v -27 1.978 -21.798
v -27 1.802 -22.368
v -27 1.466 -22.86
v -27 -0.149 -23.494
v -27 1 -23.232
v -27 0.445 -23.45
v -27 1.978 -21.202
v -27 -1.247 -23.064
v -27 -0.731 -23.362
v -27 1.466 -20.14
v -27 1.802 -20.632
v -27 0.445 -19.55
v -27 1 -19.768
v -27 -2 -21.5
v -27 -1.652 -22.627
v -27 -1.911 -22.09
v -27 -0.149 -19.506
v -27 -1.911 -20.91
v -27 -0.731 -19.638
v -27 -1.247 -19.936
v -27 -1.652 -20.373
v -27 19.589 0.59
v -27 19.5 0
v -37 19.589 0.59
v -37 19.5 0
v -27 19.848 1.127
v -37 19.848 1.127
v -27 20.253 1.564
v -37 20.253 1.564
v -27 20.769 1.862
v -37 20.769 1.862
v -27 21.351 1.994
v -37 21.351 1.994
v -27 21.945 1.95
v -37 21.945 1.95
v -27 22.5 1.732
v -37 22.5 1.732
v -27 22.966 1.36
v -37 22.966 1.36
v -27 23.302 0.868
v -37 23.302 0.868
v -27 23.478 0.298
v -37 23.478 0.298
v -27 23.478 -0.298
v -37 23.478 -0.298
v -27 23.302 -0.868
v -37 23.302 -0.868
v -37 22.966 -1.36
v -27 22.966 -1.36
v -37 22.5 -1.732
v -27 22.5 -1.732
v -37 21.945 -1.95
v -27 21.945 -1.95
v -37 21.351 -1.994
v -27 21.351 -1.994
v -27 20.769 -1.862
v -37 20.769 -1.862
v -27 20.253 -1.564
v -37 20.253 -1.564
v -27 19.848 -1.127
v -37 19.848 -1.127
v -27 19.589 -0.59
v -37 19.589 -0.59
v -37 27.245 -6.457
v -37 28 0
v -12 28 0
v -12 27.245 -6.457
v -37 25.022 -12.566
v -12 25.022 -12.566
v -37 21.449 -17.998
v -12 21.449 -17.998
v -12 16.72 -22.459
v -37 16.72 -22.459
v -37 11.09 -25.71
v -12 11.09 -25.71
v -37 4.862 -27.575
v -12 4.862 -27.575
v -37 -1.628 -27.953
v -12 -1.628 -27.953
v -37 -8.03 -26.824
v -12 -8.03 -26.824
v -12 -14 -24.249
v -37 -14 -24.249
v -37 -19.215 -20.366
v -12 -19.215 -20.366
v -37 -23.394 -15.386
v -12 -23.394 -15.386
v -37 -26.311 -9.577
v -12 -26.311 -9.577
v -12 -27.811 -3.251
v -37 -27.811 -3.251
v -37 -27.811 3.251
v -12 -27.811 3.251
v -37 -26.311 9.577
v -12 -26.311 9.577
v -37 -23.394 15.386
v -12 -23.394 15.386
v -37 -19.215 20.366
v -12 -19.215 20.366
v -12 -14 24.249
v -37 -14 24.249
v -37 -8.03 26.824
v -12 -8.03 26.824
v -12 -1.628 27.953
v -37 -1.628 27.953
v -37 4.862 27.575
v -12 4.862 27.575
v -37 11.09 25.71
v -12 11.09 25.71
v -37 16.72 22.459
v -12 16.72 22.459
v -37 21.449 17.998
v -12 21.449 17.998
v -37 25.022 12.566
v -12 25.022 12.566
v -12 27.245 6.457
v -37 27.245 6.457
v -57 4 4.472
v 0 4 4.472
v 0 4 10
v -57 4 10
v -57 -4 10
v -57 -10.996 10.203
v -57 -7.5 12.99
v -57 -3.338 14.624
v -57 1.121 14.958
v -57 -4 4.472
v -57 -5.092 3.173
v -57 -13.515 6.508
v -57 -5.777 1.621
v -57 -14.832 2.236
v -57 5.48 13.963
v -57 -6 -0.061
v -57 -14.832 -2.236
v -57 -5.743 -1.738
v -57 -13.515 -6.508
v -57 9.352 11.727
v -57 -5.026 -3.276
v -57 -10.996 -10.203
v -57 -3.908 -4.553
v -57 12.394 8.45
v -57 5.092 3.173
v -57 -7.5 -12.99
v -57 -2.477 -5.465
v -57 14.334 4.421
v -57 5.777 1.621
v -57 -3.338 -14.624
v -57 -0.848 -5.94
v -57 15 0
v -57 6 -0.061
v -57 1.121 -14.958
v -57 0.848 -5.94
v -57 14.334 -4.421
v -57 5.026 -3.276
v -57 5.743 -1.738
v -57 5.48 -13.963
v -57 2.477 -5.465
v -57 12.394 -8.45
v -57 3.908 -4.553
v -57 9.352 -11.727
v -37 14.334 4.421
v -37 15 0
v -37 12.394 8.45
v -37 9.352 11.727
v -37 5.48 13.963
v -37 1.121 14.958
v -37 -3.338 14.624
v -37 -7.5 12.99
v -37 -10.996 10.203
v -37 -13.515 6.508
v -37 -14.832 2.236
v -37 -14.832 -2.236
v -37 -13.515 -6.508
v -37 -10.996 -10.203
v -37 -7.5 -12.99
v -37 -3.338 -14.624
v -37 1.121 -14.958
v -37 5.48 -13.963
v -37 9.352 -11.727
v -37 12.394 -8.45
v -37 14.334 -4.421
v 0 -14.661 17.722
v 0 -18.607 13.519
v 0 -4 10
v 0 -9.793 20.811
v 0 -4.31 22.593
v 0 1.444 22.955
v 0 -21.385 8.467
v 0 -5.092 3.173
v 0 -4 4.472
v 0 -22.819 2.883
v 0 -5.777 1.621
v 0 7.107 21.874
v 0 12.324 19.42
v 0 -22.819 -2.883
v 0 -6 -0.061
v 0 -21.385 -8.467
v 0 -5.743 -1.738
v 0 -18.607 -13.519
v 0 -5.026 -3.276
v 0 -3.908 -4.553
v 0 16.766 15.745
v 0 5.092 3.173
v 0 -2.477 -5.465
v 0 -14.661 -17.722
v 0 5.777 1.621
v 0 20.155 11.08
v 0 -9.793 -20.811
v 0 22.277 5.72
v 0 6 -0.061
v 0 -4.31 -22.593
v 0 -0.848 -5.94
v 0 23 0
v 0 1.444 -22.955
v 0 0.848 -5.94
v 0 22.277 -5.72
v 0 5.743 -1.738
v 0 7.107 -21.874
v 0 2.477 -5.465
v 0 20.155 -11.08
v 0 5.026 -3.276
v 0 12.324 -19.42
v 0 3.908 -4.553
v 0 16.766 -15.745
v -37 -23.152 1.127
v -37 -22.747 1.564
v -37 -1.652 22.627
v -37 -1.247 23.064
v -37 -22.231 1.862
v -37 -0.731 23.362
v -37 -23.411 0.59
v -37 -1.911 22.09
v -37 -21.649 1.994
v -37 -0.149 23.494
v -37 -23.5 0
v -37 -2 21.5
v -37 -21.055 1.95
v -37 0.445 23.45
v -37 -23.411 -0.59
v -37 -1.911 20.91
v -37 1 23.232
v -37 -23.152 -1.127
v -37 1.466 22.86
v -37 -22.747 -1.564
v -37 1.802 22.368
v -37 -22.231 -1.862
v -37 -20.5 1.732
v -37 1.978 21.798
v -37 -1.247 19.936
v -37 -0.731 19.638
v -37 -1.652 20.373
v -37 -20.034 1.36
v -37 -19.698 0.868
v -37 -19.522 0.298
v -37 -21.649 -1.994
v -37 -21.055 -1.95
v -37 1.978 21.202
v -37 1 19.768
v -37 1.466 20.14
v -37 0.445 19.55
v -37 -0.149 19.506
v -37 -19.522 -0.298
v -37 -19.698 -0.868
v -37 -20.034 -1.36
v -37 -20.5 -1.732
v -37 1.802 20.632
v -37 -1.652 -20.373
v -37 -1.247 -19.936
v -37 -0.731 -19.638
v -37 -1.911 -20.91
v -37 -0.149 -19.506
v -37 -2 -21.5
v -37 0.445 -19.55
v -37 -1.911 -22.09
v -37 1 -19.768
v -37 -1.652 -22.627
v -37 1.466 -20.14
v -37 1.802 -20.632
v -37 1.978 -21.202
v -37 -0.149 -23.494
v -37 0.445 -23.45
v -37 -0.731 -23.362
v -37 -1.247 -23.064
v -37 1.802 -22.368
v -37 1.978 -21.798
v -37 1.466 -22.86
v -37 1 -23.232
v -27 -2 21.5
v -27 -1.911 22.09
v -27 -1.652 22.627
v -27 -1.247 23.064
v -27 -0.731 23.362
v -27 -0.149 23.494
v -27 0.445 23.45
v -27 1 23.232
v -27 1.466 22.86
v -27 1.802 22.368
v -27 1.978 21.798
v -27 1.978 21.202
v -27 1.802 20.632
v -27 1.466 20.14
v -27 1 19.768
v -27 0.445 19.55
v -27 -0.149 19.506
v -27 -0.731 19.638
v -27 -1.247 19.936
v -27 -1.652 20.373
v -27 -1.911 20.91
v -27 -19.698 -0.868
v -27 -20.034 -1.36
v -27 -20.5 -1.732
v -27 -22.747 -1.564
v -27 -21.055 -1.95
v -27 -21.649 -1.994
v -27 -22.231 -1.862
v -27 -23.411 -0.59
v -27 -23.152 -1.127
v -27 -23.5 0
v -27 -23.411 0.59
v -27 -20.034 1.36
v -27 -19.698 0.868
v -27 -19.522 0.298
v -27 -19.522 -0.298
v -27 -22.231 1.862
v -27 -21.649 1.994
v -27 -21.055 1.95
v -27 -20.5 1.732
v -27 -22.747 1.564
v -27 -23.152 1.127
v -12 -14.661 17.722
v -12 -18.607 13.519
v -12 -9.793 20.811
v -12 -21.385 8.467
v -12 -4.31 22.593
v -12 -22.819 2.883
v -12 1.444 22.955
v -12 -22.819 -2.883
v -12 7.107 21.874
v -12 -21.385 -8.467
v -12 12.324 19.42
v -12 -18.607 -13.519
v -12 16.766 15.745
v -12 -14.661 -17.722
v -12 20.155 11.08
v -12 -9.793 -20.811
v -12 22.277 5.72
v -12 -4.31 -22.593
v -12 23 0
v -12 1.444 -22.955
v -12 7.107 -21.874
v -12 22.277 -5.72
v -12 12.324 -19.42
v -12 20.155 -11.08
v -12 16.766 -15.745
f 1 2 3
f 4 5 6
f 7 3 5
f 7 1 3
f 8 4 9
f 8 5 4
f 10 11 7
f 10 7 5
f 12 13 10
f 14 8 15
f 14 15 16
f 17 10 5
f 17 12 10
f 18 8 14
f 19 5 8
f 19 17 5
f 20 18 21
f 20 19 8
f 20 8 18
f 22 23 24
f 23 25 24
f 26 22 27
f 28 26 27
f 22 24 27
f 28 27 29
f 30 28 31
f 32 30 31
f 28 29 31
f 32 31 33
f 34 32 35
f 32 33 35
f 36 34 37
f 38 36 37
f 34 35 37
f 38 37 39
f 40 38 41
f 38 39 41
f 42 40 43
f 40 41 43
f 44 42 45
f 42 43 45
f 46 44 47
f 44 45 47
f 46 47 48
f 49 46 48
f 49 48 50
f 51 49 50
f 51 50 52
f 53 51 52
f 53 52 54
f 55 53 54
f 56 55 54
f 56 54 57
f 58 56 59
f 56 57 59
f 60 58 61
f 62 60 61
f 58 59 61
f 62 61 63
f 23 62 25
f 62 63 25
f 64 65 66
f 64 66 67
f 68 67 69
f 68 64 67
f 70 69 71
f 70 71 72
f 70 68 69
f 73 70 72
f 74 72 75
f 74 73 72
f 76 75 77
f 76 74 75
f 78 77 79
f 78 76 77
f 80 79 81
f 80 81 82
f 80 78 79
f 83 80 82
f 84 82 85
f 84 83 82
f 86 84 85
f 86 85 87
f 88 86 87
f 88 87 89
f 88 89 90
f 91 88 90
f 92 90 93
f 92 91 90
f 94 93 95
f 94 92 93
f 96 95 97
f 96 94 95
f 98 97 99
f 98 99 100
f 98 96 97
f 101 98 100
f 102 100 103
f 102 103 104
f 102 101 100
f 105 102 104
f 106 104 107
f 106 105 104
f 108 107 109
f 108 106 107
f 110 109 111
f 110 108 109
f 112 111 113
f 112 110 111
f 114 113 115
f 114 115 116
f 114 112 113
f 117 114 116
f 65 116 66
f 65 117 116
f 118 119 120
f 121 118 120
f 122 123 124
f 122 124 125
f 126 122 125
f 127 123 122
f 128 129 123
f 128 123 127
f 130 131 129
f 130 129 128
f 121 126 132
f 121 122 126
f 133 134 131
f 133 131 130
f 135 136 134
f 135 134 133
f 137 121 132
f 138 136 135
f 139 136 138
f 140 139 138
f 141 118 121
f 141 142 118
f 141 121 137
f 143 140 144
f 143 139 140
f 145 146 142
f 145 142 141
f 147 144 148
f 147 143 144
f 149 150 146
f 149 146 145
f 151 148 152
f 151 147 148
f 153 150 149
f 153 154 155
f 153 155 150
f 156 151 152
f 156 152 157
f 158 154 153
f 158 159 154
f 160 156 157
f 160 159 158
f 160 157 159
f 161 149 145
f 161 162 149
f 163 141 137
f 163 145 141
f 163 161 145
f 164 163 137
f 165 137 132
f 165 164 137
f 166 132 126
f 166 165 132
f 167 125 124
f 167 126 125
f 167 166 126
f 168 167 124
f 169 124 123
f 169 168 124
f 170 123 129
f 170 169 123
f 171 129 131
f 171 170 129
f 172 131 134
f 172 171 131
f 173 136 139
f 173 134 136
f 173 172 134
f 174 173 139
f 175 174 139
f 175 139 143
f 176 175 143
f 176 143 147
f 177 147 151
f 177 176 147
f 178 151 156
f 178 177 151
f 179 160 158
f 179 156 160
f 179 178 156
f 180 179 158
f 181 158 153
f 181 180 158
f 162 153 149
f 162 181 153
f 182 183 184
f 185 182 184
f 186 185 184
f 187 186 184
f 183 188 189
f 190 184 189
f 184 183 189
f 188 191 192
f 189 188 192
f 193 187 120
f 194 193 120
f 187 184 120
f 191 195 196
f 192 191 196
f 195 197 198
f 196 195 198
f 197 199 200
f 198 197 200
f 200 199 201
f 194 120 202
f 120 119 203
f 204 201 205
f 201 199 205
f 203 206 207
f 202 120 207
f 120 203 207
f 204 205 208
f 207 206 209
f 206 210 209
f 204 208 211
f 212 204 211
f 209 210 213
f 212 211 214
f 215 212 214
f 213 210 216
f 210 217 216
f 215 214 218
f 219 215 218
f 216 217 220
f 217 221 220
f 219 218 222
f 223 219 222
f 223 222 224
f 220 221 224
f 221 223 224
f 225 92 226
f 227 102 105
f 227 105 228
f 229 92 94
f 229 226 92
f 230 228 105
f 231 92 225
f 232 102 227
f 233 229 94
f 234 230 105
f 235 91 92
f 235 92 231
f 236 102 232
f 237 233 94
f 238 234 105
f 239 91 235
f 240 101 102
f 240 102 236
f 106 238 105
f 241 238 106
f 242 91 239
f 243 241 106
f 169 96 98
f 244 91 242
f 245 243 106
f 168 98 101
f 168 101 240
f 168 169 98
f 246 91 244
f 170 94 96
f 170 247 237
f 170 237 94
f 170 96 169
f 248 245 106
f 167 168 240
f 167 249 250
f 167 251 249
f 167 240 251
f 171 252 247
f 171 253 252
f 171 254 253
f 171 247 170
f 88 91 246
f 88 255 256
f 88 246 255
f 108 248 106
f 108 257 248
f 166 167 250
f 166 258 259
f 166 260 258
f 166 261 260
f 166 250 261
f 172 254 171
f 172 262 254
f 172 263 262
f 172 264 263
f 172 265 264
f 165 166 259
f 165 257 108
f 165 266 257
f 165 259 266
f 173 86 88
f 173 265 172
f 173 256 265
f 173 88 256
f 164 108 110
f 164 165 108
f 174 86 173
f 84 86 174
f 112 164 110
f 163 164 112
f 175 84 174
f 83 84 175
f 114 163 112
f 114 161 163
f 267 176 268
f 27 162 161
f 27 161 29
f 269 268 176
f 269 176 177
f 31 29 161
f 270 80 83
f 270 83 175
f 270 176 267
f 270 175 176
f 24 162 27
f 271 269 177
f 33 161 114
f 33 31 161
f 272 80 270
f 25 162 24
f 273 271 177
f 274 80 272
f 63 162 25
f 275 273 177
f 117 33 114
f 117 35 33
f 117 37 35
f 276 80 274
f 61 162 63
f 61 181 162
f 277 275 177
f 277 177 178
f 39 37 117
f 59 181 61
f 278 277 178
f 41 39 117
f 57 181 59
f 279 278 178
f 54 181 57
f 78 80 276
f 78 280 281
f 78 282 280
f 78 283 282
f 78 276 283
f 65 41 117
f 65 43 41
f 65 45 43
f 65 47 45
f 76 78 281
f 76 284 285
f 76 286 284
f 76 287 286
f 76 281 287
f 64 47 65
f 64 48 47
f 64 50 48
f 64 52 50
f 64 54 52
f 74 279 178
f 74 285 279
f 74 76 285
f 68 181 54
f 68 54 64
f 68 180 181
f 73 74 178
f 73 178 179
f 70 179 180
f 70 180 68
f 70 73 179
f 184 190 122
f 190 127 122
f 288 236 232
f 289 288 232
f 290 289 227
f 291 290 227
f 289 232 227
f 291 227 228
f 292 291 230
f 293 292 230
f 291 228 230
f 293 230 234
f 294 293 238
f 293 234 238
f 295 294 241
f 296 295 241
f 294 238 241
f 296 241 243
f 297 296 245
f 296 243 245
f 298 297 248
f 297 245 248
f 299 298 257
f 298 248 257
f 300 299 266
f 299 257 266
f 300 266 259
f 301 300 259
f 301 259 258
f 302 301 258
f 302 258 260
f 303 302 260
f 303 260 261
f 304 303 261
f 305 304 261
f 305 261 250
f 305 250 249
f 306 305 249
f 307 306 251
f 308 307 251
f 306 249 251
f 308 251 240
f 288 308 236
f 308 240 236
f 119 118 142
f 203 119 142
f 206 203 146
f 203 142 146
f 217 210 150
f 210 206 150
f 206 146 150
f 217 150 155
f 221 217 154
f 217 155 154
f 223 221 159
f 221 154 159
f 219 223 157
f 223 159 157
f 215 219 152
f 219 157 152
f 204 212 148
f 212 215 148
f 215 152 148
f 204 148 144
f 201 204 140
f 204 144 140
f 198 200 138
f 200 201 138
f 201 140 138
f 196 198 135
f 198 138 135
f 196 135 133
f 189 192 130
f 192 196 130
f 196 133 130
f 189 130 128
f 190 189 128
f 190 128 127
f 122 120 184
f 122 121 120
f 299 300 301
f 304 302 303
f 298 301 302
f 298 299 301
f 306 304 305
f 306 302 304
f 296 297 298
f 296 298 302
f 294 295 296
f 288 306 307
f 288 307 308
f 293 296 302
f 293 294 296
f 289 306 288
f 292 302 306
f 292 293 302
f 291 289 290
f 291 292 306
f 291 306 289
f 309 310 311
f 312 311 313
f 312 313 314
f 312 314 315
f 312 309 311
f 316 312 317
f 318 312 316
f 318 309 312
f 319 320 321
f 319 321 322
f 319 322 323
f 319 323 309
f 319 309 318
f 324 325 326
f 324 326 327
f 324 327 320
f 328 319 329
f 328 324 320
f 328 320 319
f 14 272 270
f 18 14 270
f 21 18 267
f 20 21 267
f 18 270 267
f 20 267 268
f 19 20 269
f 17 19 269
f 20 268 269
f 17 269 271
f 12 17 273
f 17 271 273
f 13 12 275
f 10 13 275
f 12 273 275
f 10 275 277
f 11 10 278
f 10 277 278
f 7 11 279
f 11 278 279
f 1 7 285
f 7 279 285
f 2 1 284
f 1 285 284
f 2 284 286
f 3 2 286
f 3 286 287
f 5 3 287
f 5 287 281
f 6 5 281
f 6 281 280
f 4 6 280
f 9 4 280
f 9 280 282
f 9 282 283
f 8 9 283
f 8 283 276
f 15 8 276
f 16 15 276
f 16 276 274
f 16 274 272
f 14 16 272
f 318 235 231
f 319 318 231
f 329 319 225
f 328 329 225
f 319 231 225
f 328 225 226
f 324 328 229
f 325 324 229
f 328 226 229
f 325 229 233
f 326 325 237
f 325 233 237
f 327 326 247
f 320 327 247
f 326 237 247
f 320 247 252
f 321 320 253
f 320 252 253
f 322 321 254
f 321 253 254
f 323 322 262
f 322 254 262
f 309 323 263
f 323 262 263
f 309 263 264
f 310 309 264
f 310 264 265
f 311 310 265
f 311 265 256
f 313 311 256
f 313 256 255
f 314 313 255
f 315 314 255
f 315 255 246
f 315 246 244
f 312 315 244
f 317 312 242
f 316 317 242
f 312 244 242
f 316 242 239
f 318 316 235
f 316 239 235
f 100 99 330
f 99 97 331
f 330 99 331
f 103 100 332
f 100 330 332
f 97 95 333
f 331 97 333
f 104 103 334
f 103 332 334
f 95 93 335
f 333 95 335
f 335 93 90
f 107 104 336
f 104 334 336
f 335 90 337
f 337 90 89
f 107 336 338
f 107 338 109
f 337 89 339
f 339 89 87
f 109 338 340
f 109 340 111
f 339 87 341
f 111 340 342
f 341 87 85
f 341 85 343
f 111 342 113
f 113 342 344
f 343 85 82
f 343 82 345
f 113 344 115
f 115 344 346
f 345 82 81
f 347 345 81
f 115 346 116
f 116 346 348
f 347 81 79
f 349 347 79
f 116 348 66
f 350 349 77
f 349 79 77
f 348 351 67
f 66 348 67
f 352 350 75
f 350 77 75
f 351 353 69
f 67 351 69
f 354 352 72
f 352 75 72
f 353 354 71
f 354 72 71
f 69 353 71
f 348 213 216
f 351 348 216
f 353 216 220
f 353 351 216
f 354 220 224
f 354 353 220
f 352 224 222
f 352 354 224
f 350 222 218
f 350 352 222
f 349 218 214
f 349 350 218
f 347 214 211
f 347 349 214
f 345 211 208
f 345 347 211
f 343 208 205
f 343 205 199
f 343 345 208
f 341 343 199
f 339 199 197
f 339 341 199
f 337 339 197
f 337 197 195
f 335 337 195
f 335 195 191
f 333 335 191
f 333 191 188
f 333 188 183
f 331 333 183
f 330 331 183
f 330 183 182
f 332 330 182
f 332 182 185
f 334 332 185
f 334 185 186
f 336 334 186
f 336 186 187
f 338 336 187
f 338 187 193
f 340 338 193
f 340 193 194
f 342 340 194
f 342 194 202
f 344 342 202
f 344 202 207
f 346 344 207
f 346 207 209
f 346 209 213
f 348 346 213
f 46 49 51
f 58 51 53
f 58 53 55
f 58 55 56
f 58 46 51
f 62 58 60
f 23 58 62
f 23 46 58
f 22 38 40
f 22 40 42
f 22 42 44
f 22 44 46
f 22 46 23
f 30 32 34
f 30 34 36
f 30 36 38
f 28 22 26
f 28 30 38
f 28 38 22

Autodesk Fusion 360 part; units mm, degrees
sketch "Sketch1" plane through (0, 0, 0) normal (0, 0, 1) x (1, 0, 0)
  line L0 (0, 0) -> (0, 23)
  line L1 (0, 23) -> (-12, 23)
  line L2 (-12, 23) -> (-12, 28)
  line L3 (-12, 28) -> (-37, 28)
  line L4 (0, 0) -> (-57, 0)
  line L5 (-57, 0) -> (-57, 15)
  line L6 (-57, 15) -> (-37, 15)
  line L7 (-37, 15) -> (-37, 28)
  dimension "d1" = 23
  dimension "d2" = 12
  dimension "d3" = 5
  dimension "d4" = 25
  dimension "d6" = 57
  dimension "d7" = 15
revolve "Revolve1" add sketch "Sketch1" angle 360 about axis through (0, 0, 0) along (-1, 0, 0)
sketch "Sketch2" plane through (-57, 0, 0) normal (-1, 0, 0) x (0, -1, 0)
  circle A0 centre (0, 0) radius 15
  line L0 (0, 0) -> (0, -6)
  line L1 (-4, 4.4721) -> (-4, 10)
  line L2 (4, 4.4721) -> (4, 10)
  line L3 (-4, 10) -> (4, 10)
  arc A1 (-4, 4.4721) -> (4, 4.4721) centre (0, 0) ccw
  dimension "d9" = 12
extrude "Extrude1" cut sketch "Sketch2" against normal through all contours L1 L2 L3 A1
sketch "Sketch3" plane through (-37, 0, 0) normal (-1, 0, 0) x (0, -1, 0)
  circle A0 centre (0, 0) radius 15
  circle A1 centre (0, 0) radius 28
  circle A2 centre (0, 0) radius 21.5 construction
  line L0 (0, 0) -> (0, 21.5) construction
  line L1 (0, 0) -> (21.5, 0) construction
  line L2 (0, 0) -> (0, -21.5) construction
  line L3 (0, 0) -> (-21.5, 0) construction
  circle A3 centre (0, 21.5) radius 2
  circle A4 centre (-21.5, 0) radius 2
  circle A5 centre (0, -21.5) radius 2
  circle A6 centre (21.5, 0) radius 2
  dimension "d18" = 43
  dimension "d19" = 4
  dimension "d21" = 360
extrude "Extrude2" cut sketch "Sketch3" against normal blind 10 contours A3 | A4 | A5 | A6
